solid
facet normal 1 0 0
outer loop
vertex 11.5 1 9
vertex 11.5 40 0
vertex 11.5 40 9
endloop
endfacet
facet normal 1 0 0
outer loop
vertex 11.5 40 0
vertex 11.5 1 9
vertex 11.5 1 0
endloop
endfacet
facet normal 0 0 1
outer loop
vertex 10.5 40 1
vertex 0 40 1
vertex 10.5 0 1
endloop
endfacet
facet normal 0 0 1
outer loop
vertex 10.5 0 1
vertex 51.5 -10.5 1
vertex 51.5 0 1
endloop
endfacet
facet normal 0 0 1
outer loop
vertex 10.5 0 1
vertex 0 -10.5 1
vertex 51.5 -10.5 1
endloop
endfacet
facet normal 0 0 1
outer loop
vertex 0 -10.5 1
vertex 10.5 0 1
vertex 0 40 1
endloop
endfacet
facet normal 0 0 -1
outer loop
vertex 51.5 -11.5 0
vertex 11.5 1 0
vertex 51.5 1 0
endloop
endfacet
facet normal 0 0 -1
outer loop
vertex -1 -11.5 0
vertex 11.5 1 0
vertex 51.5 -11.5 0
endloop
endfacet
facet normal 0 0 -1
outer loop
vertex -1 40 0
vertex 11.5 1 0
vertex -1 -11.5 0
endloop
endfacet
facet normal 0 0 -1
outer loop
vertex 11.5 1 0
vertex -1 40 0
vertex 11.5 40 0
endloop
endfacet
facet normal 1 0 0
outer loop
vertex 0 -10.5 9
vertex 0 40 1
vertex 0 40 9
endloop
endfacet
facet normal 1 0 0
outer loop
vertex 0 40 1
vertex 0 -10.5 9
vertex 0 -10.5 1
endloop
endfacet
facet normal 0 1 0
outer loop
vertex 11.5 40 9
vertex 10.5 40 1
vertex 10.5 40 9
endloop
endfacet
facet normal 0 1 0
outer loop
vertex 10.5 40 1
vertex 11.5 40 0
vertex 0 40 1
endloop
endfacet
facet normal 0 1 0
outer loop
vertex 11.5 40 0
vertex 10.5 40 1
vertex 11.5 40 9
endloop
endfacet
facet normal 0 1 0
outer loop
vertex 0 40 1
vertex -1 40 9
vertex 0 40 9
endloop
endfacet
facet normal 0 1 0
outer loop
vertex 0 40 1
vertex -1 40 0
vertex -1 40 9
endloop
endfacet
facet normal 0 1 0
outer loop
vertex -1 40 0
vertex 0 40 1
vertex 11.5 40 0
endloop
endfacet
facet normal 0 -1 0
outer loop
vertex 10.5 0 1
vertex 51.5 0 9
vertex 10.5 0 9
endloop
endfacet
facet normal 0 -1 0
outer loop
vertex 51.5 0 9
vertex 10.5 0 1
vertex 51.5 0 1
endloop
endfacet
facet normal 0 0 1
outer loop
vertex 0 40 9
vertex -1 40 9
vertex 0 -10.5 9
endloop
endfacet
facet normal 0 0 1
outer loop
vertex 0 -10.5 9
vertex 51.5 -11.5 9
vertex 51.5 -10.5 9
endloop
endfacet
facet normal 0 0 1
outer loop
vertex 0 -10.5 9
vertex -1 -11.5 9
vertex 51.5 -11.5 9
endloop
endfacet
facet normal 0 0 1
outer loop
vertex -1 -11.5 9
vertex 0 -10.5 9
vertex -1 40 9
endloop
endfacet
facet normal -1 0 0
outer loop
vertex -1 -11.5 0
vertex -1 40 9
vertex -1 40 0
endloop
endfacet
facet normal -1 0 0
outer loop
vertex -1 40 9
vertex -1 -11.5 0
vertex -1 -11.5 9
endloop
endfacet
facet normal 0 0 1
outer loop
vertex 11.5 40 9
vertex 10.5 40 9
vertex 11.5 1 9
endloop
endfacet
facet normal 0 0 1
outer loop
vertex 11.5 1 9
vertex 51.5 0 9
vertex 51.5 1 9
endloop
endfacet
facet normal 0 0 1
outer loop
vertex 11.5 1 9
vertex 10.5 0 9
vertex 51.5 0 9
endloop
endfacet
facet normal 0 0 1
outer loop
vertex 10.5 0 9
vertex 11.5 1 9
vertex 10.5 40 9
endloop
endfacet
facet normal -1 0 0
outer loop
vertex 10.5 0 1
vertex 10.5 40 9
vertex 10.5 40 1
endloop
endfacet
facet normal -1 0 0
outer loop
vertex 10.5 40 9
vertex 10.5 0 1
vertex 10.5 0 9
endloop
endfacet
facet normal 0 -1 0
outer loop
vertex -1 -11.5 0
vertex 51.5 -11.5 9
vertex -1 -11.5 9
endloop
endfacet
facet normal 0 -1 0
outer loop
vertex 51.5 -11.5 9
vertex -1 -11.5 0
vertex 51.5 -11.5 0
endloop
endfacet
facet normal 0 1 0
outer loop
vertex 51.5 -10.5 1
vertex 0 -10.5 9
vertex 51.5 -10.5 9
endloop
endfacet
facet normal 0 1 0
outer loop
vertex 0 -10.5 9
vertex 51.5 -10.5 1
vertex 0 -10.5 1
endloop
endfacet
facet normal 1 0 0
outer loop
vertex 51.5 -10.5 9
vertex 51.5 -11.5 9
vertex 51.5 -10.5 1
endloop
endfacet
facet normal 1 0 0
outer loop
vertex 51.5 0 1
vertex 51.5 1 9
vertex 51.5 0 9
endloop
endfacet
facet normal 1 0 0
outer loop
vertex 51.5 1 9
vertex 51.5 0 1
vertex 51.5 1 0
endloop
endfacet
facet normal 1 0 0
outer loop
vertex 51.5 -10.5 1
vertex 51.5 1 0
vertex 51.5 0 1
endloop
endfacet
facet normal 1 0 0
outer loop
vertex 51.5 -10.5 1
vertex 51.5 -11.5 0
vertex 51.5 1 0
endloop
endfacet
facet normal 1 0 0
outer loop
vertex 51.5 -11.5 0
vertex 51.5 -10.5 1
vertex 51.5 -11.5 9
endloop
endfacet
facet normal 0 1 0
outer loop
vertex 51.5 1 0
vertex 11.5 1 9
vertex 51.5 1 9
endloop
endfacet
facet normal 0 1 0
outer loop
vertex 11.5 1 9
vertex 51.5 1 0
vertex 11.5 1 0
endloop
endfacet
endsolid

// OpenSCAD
module channel(width, length, height,thickness) {
    union() {
        cube([width + (thickness * 2),length,thickness]);
        rotate([0,-90,0])
        cube([height + thickness,length,thickness]);
        translate([width + (thickness * 2), 0, 0])
        rotate([0,-90,0])
        cube([height+thickness,length,thickness]);
    }
}

module edge(width, height,thickness) {
    union() {
        cube([width + (thickness * 2),width + (thickness * 2),thickness]);
        rotate([0,-90,0])
        cube([height + thickness,width + (thickness * 2),thickness]);
    }
}

module corner(width, height,thickness) {
    union() {
        cube([width + (thickness * 2),width + (thickness * 2),thickness]);
        rotate([0,-90,0])
        cube([height + thickness,width+ (thickness * 2),thickness]);
        rotate([0,-90,-90])
        cube([height + thickness,width+ (thickness * 2),thickness]);

    }
}

module lshape(width, length, height, thickness) {
    totalWidth = width + thickness * 2.0;
    
    channel(width, length, height, thickness);
    translate([0,-totalWidth,0]) {
        corner(width,height,thickness);
    }
    translate([0,-totalWidth,0])  {
        rotate([0,0,-90]) translate([-totalWidth,totalWidth,0]) {
            channel(width, length, height, thickness);
        }
    }
}

module tshape(width, length, height, thickness) {
    totalWidth = width + thickness * 2.0;
    
    channel(width, length, height, thickness);
    translate([0,-totalWidth,0]) {
        edge(width,height,thickness);
    }
    translate([0,-totalWidth,0])  {
        rotate([0,0,-90]) translate([-totalWidth,totalWidth,0]) {
            channel(width, length, height, thickness);
        }
    }
    translate([0,-totalWidth - length + thickness,0])  
    channel(width, length, height, thickness);
}

lshape(9.5, 40, 8, 1);
